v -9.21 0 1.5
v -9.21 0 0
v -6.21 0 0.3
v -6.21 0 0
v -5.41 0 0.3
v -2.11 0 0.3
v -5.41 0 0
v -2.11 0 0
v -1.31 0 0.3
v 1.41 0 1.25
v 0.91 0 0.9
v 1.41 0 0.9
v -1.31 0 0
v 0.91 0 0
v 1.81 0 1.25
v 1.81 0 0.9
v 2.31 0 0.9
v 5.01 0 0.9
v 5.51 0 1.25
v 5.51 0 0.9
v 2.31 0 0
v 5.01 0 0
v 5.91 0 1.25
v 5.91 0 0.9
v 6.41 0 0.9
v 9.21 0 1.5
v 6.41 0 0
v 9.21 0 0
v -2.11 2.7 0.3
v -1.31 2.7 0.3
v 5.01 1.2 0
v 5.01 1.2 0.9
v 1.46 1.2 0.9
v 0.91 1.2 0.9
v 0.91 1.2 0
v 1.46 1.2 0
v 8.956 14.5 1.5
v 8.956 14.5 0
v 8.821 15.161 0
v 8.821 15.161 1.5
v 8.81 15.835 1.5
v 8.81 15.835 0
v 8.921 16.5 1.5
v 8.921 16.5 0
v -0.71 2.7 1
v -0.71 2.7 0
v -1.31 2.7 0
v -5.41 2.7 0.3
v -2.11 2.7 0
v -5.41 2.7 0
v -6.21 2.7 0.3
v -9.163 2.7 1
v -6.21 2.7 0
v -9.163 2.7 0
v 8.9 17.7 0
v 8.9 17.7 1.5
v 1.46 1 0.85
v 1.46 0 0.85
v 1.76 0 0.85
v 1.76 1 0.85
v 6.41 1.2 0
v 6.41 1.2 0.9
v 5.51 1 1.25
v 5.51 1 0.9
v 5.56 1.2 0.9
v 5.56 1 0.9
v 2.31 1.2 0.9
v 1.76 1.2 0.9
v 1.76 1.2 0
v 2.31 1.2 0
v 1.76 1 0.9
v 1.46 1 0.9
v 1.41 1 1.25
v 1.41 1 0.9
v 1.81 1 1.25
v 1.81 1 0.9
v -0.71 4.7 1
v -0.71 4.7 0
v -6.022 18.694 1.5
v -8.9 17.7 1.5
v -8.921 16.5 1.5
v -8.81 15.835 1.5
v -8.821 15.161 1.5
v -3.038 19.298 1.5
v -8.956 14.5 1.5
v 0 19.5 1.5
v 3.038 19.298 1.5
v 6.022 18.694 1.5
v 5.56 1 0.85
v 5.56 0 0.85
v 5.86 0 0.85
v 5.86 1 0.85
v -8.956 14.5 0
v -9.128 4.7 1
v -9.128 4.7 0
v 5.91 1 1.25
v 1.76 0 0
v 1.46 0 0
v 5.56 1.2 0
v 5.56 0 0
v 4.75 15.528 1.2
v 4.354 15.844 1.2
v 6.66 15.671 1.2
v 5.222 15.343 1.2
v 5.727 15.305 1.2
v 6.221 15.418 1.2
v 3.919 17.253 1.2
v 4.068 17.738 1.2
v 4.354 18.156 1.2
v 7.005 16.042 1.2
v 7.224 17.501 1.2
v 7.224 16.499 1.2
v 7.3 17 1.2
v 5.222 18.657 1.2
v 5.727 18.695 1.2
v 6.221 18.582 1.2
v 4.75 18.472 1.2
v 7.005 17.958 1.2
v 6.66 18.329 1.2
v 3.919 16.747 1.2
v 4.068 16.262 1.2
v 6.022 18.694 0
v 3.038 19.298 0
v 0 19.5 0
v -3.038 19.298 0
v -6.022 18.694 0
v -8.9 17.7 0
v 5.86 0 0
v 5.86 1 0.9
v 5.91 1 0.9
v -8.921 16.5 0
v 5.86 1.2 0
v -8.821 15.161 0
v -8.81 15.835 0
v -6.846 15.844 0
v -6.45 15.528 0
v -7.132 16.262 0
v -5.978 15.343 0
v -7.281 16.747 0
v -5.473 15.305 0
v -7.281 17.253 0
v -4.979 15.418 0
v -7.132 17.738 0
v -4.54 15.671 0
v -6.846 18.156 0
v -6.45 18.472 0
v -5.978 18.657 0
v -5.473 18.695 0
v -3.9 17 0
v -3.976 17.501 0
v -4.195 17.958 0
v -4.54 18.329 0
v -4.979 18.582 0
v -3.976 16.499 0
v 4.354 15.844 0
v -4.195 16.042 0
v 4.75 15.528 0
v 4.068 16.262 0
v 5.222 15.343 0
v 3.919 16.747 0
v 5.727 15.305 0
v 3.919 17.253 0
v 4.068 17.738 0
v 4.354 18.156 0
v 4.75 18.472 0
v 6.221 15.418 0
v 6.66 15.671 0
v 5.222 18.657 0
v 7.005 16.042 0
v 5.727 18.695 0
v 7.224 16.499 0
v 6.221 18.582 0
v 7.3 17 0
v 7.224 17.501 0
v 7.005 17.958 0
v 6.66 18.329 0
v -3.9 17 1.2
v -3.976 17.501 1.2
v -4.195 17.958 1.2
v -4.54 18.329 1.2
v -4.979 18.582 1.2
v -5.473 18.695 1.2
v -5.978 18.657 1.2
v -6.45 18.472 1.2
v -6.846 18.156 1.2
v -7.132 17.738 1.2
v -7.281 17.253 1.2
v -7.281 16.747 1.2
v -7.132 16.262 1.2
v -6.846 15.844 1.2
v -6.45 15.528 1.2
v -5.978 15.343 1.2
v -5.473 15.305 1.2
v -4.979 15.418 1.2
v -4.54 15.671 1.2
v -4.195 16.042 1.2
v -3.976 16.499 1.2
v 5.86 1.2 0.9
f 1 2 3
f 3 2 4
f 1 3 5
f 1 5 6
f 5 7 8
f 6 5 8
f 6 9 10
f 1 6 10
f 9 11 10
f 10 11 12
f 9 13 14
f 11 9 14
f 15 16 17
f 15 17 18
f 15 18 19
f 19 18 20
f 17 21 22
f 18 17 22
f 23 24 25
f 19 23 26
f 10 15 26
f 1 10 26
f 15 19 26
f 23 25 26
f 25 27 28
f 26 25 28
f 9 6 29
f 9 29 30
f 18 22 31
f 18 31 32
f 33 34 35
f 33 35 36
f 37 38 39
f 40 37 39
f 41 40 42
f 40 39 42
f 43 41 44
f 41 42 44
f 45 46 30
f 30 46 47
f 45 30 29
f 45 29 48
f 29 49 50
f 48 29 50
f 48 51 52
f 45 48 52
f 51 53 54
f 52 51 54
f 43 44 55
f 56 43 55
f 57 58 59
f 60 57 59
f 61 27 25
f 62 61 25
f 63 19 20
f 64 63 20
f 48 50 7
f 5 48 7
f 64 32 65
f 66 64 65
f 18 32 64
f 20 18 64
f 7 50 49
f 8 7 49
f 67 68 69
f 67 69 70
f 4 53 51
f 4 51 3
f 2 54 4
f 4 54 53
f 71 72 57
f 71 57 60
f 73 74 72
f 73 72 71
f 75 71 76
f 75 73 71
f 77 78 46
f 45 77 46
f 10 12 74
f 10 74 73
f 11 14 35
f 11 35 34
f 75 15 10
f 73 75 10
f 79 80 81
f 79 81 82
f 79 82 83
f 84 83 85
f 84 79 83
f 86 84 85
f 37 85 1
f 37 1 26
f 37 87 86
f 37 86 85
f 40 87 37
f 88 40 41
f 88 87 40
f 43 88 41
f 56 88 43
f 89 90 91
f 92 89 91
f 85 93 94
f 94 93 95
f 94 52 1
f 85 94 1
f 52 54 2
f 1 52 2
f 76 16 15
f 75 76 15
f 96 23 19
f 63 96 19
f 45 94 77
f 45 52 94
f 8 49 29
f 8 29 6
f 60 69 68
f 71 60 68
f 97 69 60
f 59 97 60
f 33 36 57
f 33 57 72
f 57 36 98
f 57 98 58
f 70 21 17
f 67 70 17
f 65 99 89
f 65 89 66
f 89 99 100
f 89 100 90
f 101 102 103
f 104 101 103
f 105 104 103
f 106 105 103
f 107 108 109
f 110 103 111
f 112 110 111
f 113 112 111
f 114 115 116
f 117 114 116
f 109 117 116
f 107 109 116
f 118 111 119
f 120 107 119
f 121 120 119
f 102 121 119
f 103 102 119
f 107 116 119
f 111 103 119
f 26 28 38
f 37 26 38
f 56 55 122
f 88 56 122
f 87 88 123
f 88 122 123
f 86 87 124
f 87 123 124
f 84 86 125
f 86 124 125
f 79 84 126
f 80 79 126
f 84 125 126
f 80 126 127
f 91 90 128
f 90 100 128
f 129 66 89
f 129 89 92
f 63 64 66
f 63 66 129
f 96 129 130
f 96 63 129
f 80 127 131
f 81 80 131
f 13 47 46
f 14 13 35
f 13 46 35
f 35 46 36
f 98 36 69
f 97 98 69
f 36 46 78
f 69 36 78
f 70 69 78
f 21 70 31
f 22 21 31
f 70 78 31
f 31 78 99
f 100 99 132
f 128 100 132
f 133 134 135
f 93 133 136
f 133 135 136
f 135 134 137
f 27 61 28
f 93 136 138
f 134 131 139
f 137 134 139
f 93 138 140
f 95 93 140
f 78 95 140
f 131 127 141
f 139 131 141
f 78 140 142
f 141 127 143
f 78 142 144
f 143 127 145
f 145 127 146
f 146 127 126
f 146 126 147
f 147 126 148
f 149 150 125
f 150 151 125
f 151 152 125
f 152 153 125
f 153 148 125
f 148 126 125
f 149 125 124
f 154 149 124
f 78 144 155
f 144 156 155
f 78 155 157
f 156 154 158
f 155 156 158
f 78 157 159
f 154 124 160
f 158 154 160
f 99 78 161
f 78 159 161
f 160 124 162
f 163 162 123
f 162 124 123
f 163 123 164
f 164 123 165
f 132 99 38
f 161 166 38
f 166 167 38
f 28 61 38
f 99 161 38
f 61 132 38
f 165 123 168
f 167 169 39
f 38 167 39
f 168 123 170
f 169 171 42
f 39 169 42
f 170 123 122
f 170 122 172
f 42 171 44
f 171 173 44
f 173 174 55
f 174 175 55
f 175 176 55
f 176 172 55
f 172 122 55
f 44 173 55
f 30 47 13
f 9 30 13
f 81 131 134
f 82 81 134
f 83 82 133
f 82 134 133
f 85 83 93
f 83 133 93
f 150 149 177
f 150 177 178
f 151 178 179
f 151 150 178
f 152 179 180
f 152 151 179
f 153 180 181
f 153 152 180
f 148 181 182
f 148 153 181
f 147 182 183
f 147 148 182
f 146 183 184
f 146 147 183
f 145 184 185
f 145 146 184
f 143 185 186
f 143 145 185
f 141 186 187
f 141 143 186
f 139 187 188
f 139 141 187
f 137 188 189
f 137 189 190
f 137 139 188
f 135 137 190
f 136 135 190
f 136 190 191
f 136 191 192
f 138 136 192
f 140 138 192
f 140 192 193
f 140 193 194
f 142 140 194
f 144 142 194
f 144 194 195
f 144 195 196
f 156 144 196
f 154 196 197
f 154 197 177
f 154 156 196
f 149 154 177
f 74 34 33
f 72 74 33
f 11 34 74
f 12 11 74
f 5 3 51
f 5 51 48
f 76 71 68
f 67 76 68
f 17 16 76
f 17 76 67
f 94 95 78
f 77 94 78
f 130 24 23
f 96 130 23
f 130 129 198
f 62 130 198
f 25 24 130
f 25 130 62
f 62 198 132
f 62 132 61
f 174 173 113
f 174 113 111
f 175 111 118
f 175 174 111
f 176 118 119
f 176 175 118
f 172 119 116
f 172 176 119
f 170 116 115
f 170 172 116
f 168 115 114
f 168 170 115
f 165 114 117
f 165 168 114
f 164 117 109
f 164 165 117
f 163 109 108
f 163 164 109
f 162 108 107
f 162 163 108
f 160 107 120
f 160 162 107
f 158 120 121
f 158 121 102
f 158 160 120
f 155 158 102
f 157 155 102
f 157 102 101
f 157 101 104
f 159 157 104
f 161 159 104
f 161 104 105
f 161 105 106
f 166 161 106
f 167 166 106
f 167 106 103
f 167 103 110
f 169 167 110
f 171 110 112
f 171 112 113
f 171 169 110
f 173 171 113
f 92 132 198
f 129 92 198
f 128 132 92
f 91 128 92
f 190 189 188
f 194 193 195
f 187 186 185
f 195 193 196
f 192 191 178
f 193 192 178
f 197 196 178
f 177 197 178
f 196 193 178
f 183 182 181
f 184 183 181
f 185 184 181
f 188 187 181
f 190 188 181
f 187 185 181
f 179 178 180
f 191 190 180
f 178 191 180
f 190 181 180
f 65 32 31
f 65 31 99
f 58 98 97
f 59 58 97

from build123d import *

# Parameters (mm, degrees)
F1_DEPTH  = 1.5
F2_R      = 1.7
F3_DEPTH  = 1.2
F5_DEPTH  = 1
F6_W      = 0.8
F6_H      = 2.7
F7_DEPTH  = 0.3
F8_W      = 0.55
F8_H      = 0.9
F9_DEPTH  = 1.2
F10_W     = 0.3
F10_H     = 0.3
F10_W_2   = 0.0500000367
F10_H_2   = 0.05
F10_W_3   = 0.0499999633
F11_DEPTH = 1


with BuildPart() as f1:
    # F0 (on Top) → F1 (new body)
    with BuildSketch(Plane.XY):
        with BuildLine():
            Line((-8.9560451977, 14.5), (-9.21, 0))
            Line((-9.21, 0), (9.21, 0))
            Line((9.21, 0), (8.9560451977, 14.5))
            ThreePointArc((8.9560451977, 14.5), (8.8000416812, 15.4975744796), (8.9210169492, 16.5))
            Line((8.9210169492, 16.5), (8.9, 17.7))
            Line((8.9, 17.7), (-8.9, 17.7))
            Line((-8.9, 17.7), (-8.9210169492, 16.5))
            ThreePointArc((-8.9210169492, 16.5), (-8.8000416812, 15.4975744796), (-8.9560451977, 14.5))
        make_face()
        with BuildLine():
            ThreePointArc((8.9, 17.7), (0, 19.5), (-8.9, 17.7))
            Line((-8.9, 17.7), (8.9, 17.7))
        make_face()
    extrude(amount=F1_DEPTH)

    # F2 (on Top) → F3 (cut)
    with BuildSketch(Plane.XY):
        with Locations((5.6, 17)):
            Circle(F2_R)
        with Locations((-5.6, 17)):
            Circle(F2_R)
    extrude(amount=F3_DEPTH, mode=Mode.SUBTRACT)

    # F4 (on face) → F5 (cut)
    with BuildSketch(Plane(origin=(0, 0, 0), x_dir=(1, 0, 0), z_dir=(0, 0, -1))):
        Polygon((-9.1276836158, -4.7), (-0.71, -4.7), (-0.71, -2.7), (-9.1627118644, -2.7), align=None)
    extrude(amount=-F5_DEPTH, mode=Mode.SUBTRACT)

    # F6 (on face) → F7 (cut)
    with BuildSketch(Plane(origin=(0, 0, 0), x_dir=(1, 0, 0), z_dir=(0, 0, -1))):
        with Locations((-1.71, -1.35)):
            Rectangle(F6_W, F6_H)
        with Locations((-5.81, -1.35)):
            Rectangle(F6_W, F6_H)
    extrude(amount=-F7_DEPTH, mode=Mode.SUBTRACT)

    # F8 (on face) → F9 (cut)
    with BuildSketch(Plane.XZ):
        with Locations((6.135, 0.45)):
            Rectangle(F8_W, F8_H)
        with Locations((5.285, 0.45)):
            Rectangle(F8_W, F8_H)
        with Locations((1.185, 0.45)):
            Rectangle(F8_W, F8_H)
        with Locations((2.035, 0.45)):
            Rectangle(F8_W, F8_H)
    extrude(amount=-F9_DEPTH, mode=Mode.SUBTRACT)

    # F10 (on face) → F11 (cut)
    with BuildSketch(Plane.XZ):
        with Locations((1.6100000367, 1.05)):
            Rectangle(F10_W, F10_H)
        with Locations((1.7850000184, 0.875)):
            Rectangle(F10_W_2, F10_H_2)
        with Locations((1.61, 0.875)):
            Rectangle(F10_W, F10_H_2)
        with Locations((1.4350000184, 0.875)):
            Rectangle(F10_W_3, F10_H_2)
        Polygon((1.4100000367, 1.25), (1.4100000367, 0.9), (1.46, 0.9), (1.4600000367, 1.2), (1.7600000367, 1.2), (1.7600000367, 0.9), (1.8100000367, 0.9), (1.8100000367, 1.25), align=None)
        Polygon((5.5100000367, 1.25), (5.5100000367, 0.9), (5.56, 0.9), (5.5600000367, 1.2), (5.8600000367, 1.2), (5.8600000367, 0.9), (5.9100000367, 0.9), (5.9100000367, 1.25), align=None)
        with Locations((5.7100000367, 1.05)):
            Rectangle(F10_W, F10_H)
        with Locations((5.71, 0.875)):
            Rectangle(F10_W, F10_H_2)
        with Locations((5.8850000184, 0.875)):
            Rectangle(F10_W_2, F10_H_2)
        with Locations((5.5350000184, 0.875)):
            Rectangle(F10_W_3, F10_H_2)
    extrude(amount=-F11_DEPTH, mode=Mode.SUBTRACT)


solid = f1.part
